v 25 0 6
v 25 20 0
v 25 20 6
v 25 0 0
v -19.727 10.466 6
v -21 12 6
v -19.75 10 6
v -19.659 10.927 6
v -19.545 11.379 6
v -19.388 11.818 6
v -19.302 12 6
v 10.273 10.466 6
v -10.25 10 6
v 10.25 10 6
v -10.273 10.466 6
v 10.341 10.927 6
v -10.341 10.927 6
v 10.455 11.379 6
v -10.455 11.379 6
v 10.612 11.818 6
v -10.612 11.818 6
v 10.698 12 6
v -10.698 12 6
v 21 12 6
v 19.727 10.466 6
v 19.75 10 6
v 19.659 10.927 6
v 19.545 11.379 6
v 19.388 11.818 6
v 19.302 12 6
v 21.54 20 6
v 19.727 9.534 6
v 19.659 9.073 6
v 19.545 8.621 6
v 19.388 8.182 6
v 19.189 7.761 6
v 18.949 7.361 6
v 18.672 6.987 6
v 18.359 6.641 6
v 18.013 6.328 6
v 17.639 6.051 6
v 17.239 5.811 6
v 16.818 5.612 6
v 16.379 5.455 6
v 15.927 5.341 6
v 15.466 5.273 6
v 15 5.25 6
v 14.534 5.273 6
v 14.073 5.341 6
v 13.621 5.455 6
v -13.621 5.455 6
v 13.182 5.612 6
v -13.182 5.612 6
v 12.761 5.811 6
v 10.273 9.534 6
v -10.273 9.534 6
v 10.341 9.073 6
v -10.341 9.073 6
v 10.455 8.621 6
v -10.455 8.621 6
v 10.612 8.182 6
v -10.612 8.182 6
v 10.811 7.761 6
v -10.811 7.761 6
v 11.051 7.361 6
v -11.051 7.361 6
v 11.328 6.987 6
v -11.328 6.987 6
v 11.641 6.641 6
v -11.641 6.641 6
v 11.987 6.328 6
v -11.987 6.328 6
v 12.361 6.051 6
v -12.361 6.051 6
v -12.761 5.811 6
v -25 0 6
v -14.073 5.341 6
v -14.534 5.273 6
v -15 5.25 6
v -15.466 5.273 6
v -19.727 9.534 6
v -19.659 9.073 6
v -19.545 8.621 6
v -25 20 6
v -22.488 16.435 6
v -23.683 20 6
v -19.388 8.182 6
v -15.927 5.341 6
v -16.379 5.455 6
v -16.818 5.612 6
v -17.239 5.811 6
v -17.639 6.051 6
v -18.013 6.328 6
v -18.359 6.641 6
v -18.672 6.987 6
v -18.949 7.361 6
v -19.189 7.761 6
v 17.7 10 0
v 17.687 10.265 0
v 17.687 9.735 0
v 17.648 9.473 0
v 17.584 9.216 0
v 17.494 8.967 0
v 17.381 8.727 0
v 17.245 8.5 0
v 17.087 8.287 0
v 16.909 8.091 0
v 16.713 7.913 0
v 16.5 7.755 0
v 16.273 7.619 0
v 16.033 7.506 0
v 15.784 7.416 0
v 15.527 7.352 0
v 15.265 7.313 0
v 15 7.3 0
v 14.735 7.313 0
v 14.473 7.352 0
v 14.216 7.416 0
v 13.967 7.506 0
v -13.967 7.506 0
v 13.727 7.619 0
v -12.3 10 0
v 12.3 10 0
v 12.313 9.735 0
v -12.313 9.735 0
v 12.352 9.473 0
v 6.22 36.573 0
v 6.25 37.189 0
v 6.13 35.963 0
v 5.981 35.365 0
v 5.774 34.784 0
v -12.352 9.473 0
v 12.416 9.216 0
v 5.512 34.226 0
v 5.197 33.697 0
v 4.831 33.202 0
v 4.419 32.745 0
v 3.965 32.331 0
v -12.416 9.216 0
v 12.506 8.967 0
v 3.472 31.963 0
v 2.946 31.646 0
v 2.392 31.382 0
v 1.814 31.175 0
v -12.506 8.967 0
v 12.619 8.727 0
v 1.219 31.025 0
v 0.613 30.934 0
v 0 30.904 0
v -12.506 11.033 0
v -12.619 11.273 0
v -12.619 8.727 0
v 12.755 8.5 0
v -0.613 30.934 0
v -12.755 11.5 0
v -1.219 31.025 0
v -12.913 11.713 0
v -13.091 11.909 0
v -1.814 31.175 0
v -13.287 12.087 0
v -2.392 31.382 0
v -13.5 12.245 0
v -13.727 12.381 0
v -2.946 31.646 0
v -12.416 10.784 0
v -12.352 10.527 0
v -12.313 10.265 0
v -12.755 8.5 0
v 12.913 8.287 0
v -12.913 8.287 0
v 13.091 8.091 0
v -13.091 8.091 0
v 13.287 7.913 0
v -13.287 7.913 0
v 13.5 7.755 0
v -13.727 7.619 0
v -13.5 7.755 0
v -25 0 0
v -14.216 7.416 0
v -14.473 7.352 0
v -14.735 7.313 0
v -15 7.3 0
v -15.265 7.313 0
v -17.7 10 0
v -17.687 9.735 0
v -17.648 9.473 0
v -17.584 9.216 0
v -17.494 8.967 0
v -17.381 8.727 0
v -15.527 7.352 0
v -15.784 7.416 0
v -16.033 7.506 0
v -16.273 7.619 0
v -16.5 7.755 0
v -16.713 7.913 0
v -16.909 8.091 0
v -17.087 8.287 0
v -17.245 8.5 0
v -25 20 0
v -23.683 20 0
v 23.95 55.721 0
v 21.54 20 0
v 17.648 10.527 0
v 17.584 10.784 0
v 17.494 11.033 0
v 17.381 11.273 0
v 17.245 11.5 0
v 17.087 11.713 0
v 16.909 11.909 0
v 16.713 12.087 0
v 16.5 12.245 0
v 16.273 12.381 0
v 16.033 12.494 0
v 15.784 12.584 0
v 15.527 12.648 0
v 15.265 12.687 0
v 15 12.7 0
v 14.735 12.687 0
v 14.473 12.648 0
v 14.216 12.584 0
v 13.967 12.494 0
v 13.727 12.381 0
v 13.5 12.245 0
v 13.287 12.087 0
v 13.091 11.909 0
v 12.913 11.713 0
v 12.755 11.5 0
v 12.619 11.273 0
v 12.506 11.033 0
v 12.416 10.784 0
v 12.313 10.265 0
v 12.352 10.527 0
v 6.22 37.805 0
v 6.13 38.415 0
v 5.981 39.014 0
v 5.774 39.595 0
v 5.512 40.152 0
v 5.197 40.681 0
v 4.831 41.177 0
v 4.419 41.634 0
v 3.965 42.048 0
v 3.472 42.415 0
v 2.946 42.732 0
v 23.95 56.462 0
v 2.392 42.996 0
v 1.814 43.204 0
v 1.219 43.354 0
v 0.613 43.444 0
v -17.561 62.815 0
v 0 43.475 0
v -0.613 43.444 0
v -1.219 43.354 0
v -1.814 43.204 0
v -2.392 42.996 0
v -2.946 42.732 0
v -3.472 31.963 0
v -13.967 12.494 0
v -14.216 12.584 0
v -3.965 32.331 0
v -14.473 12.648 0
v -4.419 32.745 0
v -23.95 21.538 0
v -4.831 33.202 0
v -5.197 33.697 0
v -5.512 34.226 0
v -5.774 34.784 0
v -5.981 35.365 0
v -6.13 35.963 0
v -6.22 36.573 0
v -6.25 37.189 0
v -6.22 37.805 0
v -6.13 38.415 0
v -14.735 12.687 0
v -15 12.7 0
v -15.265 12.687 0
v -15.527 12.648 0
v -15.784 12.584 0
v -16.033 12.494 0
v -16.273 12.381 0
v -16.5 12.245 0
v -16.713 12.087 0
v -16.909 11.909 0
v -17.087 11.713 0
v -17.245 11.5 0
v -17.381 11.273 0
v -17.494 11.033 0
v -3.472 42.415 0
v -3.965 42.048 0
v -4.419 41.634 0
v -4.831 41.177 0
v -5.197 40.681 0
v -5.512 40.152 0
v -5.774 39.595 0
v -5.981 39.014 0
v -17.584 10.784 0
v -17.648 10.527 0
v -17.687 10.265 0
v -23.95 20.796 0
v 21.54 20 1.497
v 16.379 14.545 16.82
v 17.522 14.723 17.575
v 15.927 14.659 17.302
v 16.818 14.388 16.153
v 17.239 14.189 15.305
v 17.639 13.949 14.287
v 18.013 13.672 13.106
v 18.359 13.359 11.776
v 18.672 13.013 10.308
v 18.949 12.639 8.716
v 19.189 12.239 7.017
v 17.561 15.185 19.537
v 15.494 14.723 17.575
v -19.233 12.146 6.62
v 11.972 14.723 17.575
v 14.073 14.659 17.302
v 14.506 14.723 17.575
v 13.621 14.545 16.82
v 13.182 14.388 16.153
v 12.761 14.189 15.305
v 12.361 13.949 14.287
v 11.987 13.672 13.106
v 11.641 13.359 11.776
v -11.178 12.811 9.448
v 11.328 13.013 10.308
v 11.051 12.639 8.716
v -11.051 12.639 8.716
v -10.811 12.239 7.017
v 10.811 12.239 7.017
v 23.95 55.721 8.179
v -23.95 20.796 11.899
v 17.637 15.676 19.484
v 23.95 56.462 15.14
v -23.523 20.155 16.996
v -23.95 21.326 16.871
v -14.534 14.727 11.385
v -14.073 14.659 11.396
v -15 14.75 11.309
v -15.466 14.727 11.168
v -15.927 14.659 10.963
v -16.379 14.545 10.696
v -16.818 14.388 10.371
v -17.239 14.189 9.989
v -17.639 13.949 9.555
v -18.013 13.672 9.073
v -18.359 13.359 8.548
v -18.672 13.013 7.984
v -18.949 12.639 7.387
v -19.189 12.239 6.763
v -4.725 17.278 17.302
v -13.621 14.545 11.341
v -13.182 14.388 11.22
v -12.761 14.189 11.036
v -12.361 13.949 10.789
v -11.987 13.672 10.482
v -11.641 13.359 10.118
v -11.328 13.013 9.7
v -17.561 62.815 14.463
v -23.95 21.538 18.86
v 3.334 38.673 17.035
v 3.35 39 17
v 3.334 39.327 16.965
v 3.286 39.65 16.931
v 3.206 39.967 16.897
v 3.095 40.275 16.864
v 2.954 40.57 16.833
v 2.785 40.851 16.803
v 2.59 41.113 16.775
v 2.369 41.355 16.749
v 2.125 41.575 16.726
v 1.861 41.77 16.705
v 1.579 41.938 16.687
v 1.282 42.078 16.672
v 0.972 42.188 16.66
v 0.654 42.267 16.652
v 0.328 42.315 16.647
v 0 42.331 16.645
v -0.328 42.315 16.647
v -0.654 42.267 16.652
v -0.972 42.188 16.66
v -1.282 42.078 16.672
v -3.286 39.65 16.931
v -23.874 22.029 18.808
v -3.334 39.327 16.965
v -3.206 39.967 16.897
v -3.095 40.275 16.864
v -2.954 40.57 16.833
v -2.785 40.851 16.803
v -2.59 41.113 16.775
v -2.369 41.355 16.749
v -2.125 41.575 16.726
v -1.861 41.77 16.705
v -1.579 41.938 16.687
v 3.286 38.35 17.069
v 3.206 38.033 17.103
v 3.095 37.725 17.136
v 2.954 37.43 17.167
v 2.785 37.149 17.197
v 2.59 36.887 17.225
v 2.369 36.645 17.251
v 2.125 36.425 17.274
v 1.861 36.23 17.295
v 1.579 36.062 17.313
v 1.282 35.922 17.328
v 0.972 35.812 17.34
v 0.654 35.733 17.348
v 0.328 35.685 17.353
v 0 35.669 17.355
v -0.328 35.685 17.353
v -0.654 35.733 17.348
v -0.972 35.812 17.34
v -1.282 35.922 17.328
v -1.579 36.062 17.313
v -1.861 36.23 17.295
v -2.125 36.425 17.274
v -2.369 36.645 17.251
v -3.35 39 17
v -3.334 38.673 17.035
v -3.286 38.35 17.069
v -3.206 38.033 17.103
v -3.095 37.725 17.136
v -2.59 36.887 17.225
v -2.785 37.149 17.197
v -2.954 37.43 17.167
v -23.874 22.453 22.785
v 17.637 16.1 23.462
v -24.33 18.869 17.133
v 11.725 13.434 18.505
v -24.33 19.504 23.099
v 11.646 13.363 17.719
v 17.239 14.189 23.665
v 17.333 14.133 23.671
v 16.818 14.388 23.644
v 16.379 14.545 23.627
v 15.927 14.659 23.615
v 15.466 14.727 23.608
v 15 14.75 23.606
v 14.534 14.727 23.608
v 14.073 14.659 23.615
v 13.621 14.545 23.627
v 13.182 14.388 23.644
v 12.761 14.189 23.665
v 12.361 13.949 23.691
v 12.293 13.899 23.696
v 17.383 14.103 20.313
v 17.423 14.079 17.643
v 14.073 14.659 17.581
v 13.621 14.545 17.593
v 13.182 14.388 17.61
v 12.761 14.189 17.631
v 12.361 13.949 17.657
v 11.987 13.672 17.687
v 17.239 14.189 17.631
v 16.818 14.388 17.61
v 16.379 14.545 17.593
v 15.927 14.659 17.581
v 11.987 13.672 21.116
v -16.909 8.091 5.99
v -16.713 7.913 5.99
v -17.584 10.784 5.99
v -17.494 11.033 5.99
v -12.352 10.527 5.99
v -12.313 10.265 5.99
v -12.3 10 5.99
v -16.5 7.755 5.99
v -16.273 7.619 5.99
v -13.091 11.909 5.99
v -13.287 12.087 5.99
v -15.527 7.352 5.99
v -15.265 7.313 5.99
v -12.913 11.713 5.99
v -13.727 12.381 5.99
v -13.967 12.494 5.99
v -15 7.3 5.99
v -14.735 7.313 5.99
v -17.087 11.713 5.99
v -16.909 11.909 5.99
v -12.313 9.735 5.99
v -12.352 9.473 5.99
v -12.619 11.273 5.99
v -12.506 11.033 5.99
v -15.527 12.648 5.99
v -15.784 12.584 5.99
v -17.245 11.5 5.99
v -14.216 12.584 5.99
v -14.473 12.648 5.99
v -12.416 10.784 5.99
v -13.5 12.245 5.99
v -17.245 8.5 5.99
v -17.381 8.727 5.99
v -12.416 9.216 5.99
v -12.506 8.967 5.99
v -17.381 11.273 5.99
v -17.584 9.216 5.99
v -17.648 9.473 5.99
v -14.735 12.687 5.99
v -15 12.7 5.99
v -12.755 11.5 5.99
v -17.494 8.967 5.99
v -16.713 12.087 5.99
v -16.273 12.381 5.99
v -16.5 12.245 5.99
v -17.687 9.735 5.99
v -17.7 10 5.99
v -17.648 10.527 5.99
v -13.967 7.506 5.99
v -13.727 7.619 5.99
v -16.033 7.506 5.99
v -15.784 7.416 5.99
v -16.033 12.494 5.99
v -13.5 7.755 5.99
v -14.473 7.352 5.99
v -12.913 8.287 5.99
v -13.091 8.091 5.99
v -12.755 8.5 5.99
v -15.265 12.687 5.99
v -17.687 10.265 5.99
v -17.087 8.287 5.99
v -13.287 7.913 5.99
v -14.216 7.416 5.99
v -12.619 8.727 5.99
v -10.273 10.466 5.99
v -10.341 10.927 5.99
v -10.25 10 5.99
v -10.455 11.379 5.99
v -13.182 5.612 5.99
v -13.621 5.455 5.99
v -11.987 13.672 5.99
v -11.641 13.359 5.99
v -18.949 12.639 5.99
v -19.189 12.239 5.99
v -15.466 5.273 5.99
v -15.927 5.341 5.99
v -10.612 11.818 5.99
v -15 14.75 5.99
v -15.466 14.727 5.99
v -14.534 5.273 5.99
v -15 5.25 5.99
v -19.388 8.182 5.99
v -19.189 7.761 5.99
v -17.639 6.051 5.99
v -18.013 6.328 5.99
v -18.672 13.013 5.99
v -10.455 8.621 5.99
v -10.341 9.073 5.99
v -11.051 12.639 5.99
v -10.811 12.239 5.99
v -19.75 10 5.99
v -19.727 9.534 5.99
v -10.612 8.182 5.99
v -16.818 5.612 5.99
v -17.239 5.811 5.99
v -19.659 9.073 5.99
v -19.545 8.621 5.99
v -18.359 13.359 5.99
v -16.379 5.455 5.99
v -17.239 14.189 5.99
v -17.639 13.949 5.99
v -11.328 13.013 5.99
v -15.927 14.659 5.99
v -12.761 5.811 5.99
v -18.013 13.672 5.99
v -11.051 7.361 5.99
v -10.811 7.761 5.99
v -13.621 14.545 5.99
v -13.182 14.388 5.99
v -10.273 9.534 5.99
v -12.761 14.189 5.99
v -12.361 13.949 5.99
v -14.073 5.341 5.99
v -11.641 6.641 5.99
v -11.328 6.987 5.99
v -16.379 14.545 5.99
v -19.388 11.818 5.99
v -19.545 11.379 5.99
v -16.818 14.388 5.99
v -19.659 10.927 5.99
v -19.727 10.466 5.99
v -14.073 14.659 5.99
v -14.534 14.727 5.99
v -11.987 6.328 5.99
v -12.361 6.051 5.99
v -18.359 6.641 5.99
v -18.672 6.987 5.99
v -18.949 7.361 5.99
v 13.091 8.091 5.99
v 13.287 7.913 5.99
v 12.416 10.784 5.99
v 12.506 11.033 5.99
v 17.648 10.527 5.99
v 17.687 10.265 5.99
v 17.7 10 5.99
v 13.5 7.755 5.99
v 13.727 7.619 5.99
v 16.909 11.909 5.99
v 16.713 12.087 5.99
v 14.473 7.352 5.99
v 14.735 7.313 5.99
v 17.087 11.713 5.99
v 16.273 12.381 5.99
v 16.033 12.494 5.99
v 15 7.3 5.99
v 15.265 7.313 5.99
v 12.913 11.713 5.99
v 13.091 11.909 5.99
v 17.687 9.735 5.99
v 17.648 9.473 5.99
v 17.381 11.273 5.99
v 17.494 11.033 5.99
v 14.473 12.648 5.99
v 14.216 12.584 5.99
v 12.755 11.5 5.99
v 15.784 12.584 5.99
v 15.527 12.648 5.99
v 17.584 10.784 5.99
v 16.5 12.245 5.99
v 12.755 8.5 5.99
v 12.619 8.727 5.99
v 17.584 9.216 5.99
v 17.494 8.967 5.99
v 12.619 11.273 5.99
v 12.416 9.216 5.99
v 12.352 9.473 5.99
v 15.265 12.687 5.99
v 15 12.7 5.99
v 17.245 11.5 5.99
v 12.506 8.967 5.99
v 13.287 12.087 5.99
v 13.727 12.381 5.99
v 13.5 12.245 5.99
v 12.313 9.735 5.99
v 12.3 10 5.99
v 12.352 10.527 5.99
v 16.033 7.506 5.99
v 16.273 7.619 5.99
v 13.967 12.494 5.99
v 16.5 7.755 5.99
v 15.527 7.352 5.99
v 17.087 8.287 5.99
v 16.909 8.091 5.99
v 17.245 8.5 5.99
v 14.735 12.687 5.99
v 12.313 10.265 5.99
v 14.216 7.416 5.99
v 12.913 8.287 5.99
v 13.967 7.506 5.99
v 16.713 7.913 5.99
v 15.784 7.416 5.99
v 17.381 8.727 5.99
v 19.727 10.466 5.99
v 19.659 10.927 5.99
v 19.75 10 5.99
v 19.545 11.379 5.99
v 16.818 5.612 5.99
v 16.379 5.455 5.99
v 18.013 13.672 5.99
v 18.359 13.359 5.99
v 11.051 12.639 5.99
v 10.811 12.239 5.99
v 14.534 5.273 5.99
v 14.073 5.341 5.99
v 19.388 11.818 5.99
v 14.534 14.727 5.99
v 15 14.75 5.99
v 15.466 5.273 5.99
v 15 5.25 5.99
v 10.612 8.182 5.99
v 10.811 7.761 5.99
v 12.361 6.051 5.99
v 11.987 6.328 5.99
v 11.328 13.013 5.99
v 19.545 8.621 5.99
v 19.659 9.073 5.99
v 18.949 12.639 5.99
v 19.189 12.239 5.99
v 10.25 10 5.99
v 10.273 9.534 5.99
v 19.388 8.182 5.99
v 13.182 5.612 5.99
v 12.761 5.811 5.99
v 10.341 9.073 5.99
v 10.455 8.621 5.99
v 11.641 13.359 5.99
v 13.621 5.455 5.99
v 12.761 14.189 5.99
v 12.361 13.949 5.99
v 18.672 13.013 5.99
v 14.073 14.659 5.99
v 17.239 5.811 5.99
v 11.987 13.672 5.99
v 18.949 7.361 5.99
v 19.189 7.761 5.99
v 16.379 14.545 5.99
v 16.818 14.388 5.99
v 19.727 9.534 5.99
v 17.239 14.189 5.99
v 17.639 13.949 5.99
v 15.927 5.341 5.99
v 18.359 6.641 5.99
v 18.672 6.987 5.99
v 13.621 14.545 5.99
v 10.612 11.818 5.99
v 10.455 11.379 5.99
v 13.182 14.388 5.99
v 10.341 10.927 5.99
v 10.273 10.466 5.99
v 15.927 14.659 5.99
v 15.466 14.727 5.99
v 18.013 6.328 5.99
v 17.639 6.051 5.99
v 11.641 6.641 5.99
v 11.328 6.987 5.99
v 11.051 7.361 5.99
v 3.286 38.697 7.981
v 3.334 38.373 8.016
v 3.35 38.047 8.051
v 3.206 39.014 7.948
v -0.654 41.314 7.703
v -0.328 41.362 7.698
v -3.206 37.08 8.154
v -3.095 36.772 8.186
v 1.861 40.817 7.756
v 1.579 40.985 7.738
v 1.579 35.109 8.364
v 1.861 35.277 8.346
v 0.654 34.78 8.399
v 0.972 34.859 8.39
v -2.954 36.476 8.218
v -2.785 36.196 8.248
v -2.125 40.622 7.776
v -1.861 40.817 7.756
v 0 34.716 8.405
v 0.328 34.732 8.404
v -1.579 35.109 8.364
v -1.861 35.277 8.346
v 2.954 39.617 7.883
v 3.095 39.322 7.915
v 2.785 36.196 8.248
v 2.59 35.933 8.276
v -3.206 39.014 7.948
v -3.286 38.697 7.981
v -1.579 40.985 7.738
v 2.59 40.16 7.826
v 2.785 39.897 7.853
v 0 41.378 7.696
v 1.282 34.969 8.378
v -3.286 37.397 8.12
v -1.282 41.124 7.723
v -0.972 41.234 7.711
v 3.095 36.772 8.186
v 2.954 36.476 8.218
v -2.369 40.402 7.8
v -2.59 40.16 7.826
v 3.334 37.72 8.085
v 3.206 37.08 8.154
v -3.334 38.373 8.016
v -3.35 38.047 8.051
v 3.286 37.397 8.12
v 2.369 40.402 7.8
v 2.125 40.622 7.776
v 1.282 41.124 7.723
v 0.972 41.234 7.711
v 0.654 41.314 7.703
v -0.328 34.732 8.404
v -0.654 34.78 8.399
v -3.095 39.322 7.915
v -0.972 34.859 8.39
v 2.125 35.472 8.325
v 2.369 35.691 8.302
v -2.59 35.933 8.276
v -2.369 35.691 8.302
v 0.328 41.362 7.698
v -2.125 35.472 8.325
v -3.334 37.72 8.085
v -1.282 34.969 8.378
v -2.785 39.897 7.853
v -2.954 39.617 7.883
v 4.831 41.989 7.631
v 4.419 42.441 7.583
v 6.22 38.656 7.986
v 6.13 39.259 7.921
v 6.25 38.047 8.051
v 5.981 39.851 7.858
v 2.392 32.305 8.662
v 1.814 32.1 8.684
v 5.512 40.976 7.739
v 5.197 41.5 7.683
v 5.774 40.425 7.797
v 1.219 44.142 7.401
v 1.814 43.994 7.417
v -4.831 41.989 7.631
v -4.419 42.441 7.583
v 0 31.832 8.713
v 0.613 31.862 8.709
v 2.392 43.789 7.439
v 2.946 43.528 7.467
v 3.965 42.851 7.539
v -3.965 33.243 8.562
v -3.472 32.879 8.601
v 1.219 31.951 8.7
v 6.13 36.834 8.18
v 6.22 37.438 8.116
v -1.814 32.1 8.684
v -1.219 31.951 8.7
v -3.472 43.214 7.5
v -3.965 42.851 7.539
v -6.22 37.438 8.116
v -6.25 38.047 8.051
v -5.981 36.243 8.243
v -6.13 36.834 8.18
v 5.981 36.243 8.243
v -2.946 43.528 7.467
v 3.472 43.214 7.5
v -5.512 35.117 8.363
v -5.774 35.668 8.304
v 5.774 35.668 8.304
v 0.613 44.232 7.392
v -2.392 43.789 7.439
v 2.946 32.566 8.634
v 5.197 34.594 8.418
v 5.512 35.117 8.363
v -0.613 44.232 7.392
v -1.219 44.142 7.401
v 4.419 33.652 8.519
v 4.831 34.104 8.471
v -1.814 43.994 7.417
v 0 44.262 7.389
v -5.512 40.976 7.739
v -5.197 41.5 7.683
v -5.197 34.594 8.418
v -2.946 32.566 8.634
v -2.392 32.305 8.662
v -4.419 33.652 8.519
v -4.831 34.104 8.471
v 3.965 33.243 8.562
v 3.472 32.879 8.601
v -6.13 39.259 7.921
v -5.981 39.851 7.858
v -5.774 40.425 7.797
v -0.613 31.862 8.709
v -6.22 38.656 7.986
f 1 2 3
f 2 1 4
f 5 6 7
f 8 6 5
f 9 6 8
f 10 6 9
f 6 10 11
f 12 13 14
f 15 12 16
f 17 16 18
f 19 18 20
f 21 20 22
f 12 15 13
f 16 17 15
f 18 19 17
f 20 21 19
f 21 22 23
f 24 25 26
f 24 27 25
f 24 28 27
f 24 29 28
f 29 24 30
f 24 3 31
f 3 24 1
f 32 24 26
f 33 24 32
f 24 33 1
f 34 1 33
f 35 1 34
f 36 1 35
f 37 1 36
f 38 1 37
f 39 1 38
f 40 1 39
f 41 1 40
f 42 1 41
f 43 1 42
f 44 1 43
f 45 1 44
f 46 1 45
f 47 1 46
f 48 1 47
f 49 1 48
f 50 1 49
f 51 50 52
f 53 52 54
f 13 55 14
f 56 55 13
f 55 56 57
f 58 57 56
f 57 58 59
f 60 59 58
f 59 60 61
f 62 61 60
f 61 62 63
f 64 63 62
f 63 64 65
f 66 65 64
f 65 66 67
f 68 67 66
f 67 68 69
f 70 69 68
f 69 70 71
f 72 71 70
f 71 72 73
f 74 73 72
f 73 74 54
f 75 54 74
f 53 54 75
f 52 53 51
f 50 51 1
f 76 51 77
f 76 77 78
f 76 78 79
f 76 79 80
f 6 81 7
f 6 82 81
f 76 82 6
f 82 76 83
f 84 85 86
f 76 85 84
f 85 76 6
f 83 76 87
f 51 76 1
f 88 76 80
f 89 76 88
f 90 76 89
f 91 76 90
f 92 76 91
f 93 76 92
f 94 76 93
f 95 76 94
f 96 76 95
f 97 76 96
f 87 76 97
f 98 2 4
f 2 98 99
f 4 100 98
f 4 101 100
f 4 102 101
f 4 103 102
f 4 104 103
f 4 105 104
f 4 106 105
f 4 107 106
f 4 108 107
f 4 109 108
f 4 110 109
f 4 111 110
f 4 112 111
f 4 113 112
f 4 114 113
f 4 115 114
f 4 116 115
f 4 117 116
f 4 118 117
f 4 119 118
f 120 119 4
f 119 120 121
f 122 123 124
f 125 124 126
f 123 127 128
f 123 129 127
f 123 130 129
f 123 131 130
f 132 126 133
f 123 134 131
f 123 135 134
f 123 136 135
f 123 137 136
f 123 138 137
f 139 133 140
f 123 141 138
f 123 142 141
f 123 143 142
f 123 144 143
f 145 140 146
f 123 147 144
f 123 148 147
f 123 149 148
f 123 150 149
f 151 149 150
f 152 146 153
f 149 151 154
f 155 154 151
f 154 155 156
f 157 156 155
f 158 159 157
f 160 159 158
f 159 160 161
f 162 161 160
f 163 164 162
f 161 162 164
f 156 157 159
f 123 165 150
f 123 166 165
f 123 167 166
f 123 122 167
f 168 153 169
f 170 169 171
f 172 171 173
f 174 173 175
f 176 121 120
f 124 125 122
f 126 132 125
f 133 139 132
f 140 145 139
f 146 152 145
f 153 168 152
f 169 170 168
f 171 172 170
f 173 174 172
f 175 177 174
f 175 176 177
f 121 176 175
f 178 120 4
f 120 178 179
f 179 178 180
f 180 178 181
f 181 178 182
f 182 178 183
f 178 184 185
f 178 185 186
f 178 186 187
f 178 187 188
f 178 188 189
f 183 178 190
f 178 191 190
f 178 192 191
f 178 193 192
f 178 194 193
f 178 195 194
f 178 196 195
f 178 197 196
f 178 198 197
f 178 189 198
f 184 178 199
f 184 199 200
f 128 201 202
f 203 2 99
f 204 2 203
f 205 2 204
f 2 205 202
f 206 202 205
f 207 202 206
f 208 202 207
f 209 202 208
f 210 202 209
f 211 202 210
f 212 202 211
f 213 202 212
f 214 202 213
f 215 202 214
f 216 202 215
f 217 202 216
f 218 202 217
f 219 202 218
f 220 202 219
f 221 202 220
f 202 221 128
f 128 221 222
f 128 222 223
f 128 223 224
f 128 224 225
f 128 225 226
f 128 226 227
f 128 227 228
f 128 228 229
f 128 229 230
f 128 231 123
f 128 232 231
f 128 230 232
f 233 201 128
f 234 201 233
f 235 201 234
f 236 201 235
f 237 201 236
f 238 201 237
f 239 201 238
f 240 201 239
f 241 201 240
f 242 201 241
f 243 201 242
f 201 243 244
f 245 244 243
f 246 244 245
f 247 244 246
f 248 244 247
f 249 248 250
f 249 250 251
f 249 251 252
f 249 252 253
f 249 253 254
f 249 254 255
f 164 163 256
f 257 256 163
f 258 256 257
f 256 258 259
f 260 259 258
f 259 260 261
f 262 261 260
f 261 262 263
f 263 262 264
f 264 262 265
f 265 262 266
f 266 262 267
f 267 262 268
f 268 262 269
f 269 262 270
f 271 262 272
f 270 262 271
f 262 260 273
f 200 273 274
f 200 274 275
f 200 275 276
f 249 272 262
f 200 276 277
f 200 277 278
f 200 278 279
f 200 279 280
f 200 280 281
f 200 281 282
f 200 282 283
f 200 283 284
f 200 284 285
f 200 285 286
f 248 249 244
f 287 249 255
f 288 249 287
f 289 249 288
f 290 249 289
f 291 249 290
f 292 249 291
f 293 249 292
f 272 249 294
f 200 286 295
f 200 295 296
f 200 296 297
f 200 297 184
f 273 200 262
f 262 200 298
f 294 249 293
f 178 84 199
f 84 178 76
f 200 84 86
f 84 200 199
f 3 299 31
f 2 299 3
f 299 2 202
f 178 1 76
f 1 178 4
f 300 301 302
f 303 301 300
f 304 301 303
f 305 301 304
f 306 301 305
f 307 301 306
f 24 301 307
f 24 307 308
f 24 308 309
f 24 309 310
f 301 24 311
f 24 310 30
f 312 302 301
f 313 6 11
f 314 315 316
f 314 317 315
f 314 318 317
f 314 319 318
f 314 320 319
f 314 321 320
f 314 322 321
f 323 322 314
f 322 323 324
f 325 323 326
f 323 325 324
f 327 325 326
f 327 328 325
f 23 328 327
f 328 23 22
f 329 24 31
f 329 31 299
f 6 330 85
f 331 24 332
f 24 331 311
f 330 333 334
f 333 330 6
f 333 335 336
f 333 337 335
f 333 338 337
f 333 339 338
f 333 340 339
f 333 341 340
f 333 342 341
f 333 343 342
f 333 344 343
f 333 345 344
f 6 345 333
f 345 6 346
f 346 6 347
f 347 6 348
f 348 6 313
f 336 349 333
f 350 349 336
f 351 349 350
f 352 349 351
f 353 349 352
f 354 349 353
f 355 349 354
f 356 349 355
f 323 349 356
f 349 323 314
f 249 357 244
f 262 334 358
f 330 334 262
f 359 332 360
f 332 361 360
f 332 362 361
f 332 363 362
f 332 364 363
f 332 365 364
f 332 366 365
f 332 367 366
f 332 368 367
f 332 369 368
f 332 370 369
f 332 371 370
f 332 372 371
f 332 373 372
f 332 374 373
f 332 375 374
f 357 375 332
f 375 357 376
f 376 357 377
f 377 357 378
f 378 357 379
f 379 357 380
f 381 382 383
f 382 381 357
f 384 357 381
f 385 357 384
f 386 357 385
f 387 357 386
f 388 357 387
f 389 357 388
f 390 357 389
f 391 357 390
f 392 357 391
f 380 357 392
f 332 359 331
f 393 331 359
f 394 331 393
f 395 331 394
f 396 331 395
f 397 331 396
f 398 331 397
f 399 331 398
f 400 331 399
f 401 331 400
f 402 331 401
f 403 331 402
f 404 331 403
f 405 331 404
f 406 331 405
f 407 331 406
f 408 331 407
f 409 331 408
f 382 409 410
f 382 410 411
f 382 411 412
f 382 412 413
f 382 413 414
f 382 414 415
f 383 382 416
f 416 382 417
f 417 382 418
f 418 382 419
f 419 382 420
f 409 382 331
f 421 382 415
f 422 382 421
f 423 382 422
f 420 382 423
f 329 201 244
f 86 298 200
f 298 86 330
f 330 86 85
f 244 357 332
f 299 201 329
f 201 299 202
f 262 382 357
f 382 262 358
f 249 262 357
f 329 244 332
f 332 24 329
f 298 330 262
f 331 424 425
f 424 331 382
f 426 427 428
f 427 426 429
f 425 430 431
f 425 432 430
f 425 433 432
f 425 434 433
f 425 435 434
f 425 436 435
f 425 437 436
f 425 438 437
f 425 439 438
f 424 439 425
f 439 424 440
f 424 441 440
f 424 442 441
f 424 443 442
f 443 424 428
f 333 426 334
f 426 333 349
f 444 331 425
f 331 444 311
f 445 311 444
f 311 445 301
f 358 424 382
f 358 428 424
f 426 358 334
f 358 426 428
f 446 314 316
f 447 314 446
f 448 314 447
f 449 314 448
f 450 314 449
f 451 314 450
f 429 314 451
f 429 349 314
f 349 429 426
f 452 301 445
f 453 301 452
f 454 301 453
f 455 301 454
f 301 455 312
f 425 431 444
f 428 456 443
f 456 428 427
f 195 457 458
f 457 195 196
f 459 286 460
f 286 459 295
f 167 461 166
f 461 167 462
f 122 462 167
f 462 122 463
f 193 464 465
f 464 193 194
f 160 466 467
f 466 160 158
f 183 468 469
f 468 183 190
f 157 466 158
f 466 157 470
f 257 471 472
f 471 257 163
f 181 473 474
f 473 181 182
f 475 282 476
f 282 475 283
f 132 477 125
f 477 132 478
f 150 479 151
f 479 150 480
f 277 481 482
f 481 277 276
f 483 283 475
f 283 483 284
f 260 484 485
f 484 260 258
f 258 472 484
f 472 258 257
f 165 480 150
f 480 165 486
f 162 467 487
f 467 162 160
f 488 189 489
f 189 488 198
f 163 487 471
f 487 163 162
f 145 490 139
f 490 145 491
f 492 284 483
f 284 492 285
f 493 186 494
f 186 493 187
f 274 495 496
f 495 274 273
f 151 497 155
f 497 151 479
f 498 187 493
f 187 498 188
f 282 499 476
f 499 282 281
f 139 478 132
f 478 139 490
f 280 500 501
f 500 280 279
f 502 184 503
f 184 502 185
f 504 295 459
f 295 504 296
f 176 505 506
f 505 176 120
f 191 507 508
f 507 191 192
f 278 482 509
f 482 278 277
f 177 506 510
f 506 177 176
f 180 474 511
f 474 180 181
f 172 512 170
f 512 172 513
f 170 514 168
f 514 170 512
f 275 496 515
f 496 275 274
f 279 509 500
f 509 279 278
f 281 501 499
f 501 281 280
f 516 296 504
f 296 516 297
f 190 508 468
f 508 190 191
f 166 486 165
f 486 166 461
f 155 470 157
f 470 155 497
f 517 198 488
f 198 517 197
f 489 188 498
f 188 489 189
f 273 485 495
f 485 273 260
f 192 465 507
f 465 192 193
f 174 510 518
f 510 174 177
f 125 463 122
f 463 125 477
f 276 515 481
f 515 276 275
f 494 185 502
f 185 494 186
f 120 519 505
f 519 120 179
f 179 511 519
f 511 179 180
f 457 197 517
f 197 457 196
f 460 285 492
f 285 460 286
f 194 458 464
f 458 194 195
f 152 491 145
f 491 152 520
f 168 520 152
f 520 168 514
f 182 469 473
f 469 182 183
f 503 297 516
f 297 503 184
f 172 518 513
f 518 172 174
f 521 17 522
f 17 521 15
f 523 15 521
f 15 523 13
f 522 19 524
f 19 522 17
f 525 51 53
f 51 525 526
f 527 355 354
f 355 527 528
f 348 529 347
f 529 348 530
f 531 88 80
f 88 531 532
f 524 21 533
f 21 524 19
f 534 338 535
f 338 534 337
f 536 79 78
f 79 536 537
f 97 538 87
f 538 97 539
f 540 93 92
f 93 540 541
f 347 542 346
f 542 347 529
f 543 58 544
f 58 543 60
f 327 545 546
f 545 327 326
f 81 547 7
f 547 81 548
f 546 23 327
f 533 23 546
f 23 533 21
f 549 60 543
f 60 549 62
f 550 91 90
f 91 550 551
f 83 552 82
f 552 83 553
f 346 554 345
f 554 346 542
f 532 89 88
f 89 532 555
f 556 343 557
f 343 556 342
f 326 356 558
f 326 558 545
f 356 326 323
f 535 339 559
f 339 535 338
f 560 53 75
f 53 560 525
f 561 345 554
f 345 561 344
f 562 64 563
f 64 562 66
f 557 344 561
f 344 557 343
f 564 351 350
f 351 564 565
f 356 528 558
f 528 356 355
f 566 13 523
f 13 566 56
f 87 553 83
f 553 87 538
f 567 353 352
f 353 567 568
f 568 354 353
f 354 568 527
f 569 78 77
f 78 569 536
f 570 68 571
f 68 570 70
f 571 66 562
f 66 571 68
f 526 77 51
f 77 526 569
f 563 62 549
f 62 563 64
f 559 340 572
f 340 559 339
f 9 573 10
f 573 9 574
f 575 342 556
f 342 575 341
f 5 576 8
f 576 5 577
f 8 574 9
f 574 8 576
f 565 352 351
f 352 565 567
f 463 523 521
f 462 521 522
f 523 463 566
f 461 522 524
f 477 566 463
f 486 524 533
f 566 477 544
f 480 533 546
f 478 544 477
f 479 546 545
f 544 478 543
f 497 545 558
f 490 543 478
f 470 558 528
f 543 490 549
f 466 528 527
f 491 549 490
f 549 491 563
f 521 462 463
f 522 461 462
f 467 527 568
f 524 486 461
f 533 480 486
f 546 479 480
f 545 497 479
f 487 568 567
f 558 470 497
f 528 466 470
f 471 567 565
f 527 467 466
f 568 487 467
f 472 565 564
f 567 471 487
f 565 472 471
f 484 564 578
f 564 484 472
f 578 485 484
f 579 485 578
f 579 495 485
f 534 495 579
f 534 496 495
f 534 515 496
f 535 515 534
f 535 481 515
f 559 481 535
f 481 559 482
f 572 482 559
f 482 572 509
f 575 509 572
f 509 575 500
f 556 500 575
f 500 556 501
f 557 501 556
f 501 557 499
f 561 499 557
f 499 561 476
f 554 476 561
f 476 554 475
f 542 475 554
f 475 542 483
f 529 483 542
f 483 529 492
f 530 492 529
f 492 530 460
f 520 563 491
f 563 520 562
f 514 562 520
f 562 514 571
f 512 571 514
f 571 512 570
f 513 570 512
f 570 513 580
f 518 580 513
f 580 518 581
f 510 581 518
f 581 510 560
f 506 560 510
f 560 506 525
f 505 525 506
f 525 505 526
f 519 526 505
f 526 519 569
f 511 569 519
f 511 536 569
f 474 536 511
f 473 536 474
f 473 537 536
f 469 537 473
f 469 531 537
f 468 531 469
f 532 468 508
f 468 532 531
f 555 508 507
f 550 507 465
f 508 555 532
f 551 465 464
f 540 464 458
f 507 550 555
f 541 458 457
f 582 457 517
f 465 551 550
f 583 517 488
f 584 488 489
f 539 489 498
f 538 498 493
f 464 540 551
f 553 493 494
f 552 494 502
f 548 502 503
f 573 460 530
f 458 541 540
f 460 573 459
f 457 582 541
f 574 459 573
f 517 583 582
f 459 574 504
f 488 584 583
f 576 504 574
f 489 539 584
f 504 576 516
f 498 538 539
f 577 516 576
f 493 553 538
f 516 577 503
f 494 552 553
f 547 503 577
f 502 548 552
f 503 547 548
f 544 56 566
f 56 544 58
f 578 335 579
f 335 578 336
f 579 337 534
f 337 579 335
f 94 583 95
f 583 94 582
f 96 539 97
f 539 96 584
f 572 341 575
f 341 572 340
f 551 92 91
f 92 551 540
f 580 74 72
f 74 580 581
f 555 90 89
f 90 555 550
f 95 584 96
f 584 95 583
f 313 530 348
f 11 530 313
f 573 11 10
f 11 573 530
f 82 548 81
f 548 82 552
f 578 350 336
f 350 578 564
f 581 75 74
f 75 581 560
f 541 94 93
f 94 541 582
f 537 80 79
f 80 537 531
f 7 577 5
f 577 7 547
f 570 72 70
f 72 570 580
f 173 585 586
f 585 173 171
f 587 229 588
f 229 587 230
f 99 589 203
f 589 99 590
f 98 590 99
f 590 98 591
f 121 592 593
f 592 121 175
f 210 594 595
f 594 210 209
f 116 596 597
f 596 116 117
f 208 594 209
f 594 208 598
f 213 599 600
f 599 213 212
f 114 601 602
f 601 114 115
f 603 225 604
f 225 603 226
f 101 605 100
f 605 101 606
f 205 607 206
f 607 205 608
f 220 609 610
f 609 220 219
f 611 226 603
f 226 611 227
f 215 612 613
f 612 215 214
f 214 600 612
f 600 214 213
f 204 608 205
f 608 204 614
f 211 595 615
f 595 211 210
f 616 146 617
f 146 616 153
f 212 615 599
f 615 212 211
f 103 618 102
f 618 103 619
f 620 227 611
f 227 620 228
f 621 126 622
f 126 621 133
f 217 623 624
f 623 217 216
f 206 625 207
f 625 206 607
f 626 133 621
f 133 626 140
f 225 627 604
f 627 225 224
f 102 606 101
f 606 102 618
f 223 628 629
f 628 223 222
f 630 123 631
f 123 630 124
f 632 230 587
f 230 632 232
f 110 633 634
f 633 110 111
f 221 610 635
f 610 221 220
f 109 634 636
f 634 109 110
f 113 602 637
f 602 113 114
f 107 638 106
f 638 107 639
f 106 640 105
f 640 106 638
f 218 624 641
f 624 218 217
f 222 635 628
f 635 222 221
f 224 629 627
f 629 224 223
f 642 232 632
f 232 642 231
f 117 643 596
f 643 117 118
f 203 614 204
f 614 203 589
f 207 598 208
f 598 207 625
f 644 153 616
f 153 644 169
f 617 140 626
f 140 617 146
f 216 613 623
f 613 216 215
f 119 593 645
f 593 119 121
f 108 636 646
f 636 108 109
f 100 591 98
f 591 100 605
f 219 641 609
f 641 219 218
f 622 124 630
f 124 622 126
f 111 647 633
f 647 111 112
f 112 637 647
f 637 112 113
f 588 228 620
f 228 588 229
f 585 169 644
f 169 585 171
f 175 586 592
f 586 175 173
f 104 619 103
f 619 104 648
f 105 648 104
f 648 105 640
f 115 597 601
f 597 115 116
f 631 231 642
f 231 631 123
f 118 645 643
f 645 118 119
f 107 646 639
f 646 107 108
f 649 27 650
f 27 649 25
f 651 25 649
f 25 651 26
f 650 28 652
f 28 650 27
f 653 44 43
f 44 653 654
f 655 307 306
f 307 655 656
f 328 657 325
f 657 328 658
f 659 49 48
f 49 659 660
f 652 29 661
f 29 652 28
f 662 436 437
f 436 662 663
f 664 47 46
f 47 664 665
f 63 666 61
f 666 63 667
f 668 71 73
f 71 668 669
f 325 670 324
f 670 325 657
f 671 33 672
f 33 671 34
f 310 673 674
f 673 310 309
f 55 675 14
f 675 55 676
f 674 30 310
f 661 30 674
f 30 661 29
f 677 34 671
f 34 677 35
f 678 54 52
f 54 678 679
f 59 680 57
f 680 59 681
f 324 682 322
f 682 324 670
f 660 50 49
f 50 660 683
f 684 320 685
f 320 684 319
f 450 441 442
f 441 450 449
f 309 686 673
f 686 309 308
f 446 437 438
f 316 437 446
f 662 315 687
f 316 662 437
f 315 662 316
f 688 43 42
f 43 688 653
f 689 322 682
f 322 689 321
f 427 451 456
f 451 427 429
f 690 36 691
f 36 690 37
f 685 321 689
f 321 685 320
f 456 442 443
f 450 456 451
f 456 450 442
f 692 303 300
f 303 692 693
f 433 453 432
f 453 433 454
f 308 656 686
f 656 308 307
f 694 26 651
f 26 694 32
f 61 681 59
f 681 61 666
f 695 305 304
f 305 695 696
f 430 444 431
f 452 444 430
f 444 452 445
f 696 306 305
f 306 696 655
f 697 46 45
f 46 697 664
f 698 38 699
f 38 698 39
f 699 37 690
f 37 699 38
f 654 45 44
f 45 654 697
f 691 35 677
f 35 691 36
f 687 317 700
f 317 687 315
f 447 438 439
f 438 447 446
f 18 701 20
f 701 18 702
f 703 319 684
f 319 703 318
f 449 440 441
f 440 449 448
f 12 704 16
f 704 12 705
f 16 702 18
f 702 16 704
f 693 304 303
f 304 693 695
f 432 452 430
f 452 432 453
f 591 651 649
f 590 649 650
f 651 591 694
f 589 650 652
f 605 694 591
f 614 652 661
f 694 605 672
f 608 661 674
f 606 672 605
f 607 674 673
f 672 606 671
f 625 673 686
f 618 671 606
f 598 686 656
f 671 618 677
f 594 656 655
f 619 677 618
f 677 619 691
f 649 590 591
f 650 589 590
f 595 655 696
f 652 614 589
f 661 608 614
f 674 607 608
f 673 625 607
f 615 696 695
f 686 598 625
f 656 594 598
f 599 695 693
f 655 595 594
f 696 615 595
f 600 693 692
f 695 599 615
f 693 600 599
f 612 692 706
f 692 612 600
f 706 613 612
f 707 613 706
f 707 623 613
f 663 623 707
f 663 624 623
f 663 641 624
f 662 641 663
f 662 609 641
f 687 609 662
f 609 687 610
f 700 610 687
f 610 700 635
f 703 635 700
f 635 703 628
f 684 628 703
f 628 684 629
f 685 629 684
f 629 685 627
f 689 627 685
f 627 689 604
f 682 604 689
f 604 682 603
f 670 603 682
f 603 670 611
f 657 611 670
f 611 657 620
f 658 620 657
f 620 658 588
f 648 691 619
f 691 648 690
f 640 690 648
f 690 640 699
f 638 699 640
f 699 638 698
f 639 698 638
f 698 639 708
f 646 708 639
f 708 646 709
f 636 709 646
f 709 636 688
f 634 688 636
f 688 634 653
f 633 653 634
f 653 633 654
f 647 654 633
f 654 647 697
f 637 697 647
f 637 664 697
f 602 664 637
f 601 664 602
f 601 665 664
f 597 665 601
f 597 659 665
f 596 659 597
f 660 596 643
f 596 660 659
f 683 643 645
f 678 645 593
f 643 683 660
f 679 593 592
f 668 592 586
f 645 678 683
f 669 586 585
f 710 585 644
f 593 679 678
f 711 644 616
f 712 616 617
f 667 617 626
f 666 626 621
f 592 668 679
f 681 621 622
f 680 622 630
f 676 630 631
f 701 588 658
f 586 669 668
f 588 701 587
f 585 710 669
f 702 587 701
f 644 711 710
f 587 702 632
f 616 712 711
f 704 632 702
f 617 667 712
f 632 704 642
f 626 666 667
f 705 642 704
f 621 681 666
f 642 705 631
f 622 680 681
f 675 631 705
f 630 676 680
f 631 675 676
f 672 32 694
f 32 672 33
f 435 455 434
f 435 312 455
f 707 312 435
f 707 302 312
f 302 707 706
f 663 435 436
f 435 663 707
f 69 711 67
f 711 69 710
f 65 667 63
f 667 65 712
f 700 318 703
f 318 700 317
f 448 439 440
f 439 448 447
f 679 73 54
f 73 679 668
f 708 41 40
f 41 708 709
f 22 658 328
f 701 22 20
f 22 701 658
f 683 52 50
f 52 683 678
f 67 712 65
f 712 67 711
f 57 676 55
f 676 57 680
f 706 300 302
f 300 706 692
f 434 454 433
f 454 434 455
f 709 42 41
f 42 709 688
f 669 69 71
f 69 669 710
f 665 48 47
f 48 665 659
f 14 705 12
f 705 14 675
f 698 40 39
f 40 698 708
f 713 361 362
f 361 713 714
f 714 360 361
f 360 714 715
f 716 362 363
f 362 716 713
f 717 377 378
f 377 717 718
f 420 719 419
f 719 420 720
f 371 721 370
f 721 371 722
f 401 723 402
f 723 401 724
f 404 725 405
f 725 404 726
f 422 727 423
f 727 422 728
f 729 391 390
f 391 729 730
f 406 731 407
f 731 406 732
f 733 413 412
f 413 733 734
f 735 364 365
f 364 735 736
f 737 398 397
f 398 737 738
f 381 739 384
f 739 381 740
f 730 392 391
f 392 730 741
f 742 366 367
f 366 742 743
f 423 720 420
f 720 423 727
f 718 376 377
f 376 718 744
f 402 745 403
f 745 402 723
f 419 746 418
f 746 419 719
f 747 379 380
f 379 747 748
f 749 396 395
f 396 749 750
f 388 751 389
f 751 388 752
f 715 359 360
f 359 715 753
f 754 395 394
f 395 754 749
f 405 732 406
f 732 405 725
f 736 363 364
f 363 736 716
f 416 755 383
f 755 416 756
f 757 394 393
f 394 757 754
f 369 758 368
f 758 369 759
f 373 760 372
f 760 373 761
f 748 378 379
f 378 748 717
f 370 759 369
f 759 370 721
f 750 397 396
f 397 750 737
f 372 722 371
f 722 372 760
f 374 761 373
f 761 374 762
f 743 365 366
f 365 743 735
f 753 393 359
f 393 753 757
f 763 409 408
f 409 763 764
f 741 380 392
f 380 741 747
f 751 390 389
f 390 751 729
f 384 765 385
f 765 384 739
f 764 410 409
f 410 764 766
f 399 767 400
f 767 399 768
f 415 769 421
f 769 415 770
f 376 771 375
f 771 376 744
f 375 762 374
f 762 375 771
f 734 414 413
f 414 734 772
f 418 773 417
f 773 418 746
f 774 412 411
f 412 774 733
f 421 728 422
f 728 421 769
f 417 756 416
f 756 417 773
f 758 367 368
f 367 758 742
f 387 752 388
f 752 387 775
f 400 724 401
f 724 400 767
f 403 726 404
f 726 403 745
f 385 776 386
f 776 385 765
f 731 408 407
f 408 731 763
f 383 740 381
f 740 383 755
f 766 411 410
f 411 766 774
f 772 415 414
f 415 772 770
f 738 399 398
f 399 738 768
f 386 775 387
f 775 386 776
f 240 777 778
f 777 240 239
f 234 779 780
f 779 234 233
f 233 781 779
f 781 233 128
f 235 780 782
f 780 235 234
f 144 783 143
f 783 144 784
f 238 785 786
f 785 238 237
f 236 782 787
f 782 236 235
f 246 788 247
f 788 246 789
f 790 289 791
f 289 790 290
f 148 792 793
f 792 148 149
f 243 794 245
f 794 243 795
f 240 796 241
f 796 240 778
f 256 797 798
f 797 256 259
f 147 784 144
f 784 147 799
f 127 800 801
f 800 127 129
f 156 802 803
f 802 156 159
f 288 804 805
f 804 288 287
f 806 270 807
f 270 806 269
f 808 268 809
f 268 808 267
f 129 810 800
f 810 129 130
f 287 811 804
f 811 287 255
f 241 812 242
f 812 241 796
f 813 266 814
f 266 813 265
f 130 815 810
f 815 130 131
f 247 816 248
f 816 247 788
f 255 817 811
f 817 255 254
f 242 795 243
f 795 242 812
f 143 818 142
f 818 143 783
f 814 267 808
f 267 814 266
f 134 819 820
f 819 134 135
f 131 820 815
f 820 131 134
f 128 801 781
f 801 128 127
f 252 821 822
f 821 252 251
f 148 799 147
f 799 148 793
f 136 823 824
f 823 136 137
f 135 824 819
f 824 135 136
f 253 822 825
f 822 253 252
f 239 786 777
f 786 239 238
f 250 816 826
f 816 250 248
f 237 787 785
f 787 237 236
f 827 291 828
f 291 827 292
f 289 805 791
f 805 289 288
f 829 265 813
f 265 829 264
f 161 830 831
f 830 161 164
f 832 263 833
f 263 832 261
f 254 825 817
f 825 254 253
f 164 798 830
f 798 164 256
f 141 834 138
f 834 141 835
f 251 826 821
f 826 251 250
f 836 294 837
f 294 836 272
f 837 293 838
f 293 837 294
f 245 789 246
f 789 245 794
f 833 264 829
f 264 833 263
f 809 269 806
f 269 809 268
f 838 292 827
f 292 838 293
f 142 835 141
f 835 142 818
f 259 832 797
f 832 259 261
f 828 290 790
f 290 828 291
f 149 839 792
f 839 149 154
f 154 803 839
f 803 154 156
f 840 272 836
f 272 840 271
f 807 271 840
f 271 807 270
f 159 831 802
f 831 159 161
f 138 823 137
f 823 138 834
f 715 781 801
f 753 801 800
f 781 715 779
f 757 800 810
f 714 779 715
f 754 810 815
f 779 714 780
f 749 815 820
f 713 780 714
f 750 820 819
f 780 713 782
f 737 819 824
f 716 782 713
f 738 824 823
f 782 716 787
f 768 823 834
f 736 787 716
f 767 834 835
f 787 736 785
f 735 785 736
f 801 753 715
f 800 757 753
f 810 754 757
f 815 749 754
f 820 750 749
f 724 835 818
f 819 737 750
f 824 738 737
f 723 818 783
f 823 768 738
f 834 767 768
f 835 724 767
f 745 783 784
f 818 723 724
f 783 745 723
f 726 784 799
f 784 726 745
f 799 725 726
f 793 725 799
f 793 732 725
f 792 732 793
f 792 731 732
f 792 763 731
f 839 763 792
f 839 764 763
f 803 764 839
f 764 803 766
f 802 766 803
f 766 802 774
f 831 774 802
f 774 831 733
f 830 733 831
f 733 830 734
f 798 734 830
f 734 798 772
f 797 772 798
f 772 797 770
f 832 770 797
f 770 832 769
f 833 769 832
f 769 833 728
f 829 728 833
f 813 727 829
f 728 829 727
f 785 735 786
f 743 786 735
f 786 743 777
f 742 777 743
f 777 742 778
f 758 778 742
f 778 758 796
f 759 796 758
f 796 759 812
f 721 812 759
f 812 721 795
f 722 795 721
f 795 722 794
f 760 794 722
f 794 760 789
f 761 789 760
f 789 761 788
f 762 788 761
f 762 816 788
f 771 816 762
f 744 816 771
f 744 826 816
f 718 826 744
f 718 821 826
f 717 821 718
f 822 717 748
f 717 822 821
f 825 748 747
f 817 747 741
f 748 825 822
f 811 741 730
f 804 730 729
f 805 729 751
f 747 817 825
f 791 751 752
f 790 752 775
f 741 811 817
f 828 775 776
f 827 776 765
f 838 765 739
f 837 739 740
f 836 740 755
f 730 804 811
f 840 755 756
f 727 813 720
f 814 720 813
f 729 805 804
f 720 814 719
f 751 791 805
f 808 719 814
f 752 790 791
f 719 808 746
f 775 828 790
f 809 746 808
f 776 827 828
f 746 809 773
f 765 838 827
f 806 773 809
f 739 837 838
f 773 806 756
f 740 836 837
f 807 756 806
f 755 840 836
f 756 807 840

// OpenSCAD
// file: generated/rig_angles.scad
// GENERATED by tools/export_cad.py - do not edit.
// [name, yaw_deg (+ = counter-clockwise seen from above), pitch_deg (+ = up)]
// Mount the two cameras of a pair 200 mm apart (lens centre to lens centre).
cams = [
  ["ballA", -8.75, -6.08],
  ["ballB", 8.75, -6.08],
  ["clubA", -9.98, -15.50],
  ["clubB", 9.98, -15.50]
];
// main file
// Camera mount for 2020 aluminium extrusion. The camera bolts on with its 1/4"-20 tripod
// adapter (supplied with the Pi Global Shutter camera). The platform is pre-tilted
// to the rig's pitch, and its back fence is turned to the toe-in (yaw) angle, so the
// cameras point roughly at the right spot. Stereo calibration measures the exact pose
// afterwards, so a degree or two of error doesn't matter.
//
// UNVERIFIED: check the tripod adapter's footprint against a real camera before printing all of them.
//
// Angles per camera come from the rig geometry (cad/generated/rig_angles.scad).
// Print: PETG, flat side down, 4 walls, 40% infill, no supports.
// Screws: 2x M5x10 + 2020 T-nuts; 1x 1/4"-20 x 5/8" into the camera's tripod adapter
// (9 mm of plastic + ~6 mm of thread; check the adapter's thread depth so it can't hit the PCB).
include <generated/rig_angles.scad>

cam = 0;                 // index into cams[] (generated): 0 = A, 1 = B, 2/3 = stage-2 club pair
yaw = cams[cam][1];
pitch = cams[cam][2];

foot_l = 50;             // along the extrusion
foot_w = 20;             // 2020 profile width
foot_t = 6;
m5_d = 5.4;
m5_head_d = 9.5;
m5_spacing = 30;
plat = 42;               // camera platform (square), overhangs the extrusion
plat_t = 7;
tripod_d = 6.7;          // 1/4"-20 clearance
tripod_head_d = 12.5;
fence_h = 4;
fence_t = 3;
$fn = 64;

module platform_top() {
    // plate in its own tilted frame: top surface at z = 0
    rotate([0, 0, yaw]) translate([-plat / 2, -plat / 2, -plat_t]) cube([plat, plat, plat_t]);
}

module fence() {
    rotate([0, 0, yaw]) translate([-plat / 2, -plat / 2 - fence_t + 0.5, -2]) cube([plat, fence_t, fence_h + 2]);
}

center = [0, foot_w + plat / 2 - 2, foot_t + plat_t + 4];  // back edge clears the M5 heads

difference() {
    union() {
        translate([-foot_l / 2, 0, 0]) cube([foot_l, foot_w, foot_t]);
        // Solid down to the bed under the whole platform: printable without supports.
        hull() {
            translate([-plat / 2, foot_w - 8, 0]) cube([plat, 8, foot_t]);
            linear_extrude(1) projection() translate(center) rotate([pitch, 0, 0]) platform_top();
            translate(center) rotate([pitch, 0, 0]) platform_top();
        }
        translate(center) rotate([pitch, 0, 0]) fence();
    }
    for (x = [-m5_spacing / 2, m5_spacing / 2])
        translate([x, foot_w / 2, -1]) {
            cylinder(d = m5_d, h = 50);
            translate([0, 0, foot_t + 1 - 0.01]) cylinder(d = m5_head_d, h = 50);  // head seats on the foot
        }
    translate(center) rotate([pitch, 0, 0]) {
        translate([0, 0, -60]) cylinder(d = tripod_d, h = 70);
        translate([0, 0, -60 - plat_t - 2]) cylinder(d = tripod_head_d, h = 60);
    }
}
